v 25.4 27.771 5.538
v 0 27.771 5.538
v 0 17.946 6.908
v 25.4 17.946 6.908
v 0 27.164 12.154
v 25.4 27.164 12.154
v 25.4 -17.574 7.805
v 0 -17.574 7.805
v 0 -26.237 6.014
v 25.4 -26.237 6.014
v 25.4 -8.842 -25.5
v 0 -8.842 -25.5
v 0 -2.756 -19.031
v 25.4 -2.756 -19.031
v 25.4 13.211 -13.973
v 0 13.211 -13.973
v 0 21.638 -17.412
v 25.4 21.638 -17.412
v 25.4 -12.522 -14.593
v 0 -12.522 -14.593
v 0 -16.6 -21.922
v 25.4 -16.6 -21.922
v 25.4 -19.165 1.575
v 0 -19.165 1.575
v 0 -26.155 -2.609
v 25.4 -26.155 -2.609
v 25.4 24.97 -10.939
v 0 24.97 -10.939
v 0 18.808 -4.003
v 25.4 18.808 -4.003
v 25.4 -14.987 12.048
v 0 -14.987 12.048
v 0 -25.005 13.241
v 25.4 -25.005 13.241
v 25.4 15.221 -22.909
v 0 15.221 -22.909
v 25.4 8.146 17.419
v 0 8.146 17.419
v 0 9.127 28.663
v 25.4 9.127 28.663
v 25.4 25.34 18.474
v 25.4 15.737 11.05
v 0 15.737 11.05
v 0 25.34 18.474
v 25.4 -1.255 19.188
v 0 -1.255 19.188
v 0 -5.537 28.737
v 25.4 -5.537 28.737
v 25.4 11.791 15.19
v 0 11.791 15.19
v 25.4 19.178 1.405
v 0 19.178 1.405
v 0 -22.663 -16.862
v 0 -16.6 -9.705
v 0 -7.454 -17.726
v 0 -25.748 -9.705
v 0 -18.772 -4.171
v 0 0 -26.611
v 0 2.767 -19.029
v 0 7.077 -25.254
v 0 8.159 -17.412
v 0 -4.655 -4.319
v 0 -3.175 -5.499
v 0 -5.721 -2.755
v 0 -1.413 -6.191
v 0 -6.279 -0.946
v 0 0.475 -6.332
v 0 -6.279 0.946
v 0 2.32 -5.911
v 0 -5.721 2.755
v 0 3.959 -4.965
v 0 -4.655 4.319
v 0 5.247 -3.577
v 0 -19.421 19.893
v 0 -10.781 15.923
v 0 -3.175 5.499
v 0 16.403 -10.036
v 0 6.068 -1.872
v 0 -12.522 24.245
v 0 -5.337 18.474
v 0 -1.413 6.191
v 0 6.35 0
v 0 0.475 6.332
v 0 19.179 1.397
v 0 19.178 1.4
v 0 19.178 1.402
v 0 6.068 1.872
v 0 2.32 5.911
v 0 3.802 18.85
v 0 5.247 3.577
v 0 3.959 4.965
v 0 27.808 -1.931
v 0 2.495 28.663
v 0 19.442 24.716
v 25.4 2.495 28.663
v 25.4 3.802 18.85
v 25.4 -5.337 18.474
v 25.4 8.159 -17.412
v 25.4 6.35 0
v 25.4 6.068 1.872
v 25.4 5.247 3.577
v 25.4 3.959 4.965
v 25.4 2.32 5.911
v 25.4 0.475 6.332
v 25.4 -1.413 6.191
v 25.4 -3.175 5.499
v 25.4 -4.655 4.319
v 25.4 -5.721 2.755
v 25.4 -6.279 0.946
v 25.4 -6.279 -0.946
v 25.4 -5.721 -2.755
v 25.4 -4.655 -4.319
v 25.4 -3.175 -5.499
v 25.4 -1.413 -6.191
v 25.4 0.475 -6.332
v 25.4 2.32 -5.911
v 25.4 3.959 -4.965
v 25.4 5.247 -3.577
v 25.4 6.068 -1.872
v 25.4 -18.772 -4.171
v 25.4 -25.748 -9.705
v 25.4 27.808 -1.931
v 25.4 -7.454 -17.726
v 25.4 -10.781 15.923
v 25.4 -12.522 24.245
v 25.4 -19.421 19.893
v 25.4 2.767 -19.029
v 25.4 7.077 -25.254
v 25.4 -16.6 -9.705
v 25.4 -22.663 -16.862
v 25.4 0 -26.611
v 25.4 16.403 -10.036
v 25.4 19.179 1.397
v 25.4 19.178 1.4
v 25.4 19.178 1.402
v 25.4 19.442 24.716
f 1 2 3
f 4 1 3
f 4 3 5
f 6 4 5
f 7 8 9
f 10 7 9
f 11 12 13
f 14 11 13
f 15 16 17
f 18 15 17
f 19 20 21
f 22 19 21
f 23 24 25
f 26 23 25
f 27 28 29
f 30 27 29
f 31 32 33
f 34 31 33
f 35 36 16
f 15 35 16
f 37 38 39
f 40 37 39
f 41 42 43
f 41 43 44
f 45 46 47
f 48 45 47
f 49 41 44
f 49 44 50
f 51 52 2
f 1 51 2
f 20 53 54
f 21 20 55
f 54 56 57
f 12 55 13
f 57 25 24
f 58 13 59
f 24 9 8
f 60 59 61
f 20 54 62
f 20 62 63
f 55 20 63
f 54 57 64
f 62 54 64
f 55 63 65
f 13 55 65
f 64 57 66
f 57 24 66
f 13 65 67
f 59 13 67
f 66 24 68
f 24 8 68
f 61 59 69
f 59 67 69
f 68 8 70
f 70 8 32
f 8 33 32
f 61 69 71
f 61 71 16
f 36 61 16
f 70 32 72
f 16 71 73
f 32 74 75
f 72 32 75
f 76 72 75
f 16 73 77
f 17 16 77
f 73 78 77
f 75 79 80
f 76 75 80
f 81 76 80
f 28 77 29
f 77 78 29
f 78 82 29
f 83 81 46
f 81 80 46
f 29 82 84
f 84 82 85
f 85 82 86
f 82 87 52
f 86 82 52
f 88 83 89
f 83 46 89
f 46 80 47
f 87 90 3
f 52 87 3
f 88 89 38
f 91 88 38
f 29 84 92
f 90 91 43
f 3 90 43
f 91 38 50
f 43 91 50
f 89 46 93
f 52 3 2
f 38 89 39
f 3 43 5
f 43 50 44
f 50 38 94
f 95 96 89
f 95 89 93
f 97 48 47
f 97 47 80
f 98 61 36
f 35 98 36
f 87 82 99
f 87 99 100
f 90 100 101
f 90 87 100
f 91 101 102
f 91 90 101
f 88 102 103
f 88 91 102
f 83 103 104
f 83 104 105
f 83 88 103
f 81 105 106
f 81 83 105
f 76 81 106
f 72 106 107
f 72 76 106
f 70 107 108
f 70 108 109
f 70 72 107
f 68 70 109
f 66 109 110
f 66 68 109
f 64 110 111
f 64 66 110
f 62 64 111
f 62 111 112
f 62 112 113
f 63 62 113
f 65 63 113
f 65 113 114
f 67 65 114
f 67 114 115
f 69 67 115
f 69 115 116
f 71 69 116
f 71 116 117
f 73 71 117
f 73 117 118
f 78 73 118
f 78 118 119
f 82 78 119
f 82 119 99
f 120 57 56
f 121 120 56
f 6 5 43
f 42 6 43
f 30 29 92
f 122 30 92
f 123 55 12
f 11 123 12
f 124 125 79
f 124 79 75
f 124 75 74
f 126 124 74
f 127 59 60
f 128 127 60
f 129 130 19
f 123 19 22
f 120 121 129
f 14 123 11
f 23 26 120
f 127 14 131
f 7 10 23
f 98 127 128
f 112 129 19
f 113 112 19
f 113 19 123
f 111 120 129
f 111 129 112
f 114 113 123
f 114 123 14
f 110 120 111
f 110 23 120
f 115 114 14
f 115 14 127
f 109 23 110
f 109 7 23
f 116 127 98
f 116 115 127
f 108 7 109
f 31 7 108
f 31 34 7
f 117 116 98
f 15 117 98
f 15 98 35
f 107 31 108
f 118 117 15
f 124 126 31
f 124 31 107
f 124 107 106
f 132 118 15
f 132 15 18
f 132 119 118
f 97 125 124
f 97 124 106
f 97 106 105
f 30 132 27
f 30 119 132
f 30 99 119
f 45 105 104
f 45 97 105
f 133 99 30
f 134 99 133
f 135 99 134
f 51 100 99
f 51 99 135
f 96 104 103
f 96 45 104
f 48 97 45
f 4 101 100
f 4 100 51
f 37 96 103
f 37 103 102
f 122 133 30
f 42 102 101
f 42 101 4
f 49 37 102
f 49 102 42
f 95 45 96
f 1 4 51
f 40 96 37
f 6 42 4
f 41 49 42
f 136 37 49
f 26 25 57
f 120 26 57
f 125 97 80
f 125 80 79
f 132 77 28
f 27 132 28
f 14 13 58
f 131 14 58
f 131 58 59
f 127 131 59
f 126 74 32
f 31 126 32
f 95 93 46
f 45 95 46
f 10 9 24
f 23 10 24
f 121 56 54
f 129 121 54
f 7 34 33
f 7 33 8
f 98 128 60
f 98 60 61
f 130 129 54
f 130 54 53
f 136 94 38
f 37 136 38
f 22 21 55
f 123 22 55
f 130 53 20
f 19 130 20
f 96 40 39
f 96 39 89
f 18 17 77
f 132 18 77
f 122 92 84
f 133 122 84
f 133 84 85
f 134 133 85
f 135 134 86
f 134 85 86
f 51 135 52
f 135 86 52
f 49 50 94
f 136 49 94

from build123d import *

# Parameters (mm, degrees)
F0_R     = 6.35
F1_DEPTH = 12.7
F2_DEPTH = 25.4


with BuildPart() as f1:
    # F0 (on Right) → F1 (new body)
    with BuildSketch(Plane.YZ):
        with BuildLine():
            ThreePointArc((19.1779890784, 1.4045410483), (18.7646486695, 4.2018996845), (17.9455312271, 6.9083941421))
            ThreePointArc((17.9455312271, 6.9083941421), (16.9682929221, 9.0468246339), (15.7373856101, 11.0500088147))
            ThreePointArc((15.7373856101, 11.0500088147), (13.9188023359, 13.267816029), (11.7905793137, 15.1904654337))
            ThreePointArc((11.7905793137, 15.1904654337), (10.0305268432, 16.4059907319), (8.146362677, 17.4185181856))
            Line((8.146362677, 17.4185181856), (6.2738156783, 18.1771075114))
            ThreePointArc((6.2738156783, 18.1771075114), (5.0492538332, 18.5545960984), (3.8022694856, 18.8496882575))
            ThreePointArc((3.8022694856, 18.8496882575), (1.284752774, 19.1863860838), (-1.2551787188, 19.1883435197))
            ThreePointArc((-1.2551787188, 19.1883435197), (-3.3155527437, 18.9413597888), (-5.33731542, 18.473794))
            ThreePointArc((-5.33731542, 18.473794), (-8.1592905959, 17.4124661556), (-10.7806869477, 15.9230898252))
            ThreePointArc((-10.7806869477, 15.9230898252), (-13.0287220692, 14.1428569211), (-14.987024811, 12.0481155357))
            ThreePointArc((-14.987024811, 12.0481155357), (-16.4183682627, 10.0102539547), (-17.5743483924, 7.8045037785))
            ThreePointArc((-17.5743483924, 7.8045037785), (-18.6316829863, 4.7569307063), (-19.1647025444, 1.5754926314))
            ThreePointArc((-19.1647025444, 1.5754926314), (-19.1845061039, -1.3125266459), (-18.7715548633, -4.1709385826))
            ThreePointArc((-18.7715548633, -4.1709385826), (-17.9011716614, -7.0225389849), (-16.6004457918, -9.705318138))
            ThreePointArc((-16.6004457918, -9.705318138), (-14.7650993301, -12.3190844798), (-12.5224487856, -14.5930215192))
            ThreePointArc((-12.5224487856, -14.5930215192), (-10.1104693622, -16.356845965), (-7.4543542534, -17.7257045928))
            ThreePointArc((-7.4543542534, -17.7257045928), (-5.1467207251, -18.5277971282), (-2.7560125907, -19.0308274977))
            ThreePointArc((-2.7560125907, -19.0308274977), (0.0055746036, -19.229351772), (2.7670462291, -19.0292263588))
            ThreePointArc((2.7670462291, -19.0292263588), (5.5227369883, -18.4192121657), (8.1594508744, -17.4123910499))
            ThreePointArc((8.1594508744, -17.4123910499), (10.8224755536, -15.8947168436), (13.2105236497, -13.973190958))
            ThreePointArc((13.2105236497, -13.973190958), (14.9368977955, -12.1102058155), (16.4026784276, -10.0359424594))
            ThreePointArc((16.4026784276, -10.0359424594), (17.8618765328, -7.1218935245), (18.8080234165, -4.003280631))
            ThreePointArc((18.8080234165, -4.003280631), (19.1237302096, -2.0126955852), (19.22935258, 0))
            ThreePointArc((19.22935258, 0), (19.2166394569, 0.6991198959), (19.1785168978, 1.397315372))
            Line((19.1785168978, 1.397315372), (19.1698875278, 1.4006438432))
            Line((19.1698875278, 1.4006438432), (19.1779890784, 1.4045410483))
        make_face()
        Circle(F0_R, mode=Mode.SUBTRACT)
        with BuildLine():
            Line((27.7707912028, 5.5380598642), (17.9455312271, 6.9083941421))
            ThreePointArc((17.9455312271, 6.9083941421), (18.7646486695, 4.2018996845), (19.1779890784, 1.4045410483))
            Line((19.1779890784, 1.4045410483), (27.7707912028, 5.5380598642))
        make_face()
        with BuildLine():
            ThreePointArc((15.7373856101, 11.0500088147), (16.9682929221, 9.0468246339), (17.9455312271, 6.9083941421))
            Line((17.9455312271, 6.9083941421), (27.1644499153, 12.1538350359))
            Line((27.1644499153, 12.1538350359), (15.7373856101, 11.0500088147))
        make_face()
        with BuildLine():
            ThreePointArc((11.7905793137, 15.1904654337), (13.9188023359, 13.267816029), (15.7373856101, 11.0500088147))
            Line((15.7373856101, 11.0500088147), (25.3397952765, 18.473794))
            Line((25.3397952765, 18.473794), (11.7905793137, 15.1904654337))
        make_face()
        with BuildLine():
            ThreePointArc((19.1785168978, 1.397315372), (19.1782533284, 1.400928235), (19.1779890784, 1.4045410483))
            Line((19.1779890784, 1.4045410483), (19.1698875278, 1.4006438432))
            Line((19.1698875278, 1.4006438432), (19.1785168978, 1.397315372))
        make_face()
        with BuildLine():
            ThreePointArc((8.146362677, 17.4185181856), (10.0305268432, 16.4059907319), (11.7905793137, 15.1904654337))
            Line((11.7905793137, 15.1904654337), (19.4416427454, 24.7160838446))
            Line((19.4416427454, 24.7160838446), (8.146362677, 17.4185181856))
        make_face()
        with BuildLine():
            Line((27.8078578413, -1.9311446231), (19.1785168978, 1.397315372))
            ThreePointArc((19.1785168978, 1.397315372), (19.2166394569, 0.6991198959), (19.22935258, 0))
            ThreePointArc((19.22935258, 0), (19.1237302096, -2.0126955852), (18.8080234165, -4.003280631))
            Line((18.8080234165, -4.003280631), (27.8078578413, -1.9311446231))
        make_face()
        with BuildLine():
            Line((6.2738156783, 18.1771075114), (8.146362677, 17.4185181856))
            ThreePointArc((8.146362677, 17.4185181856), (7.2200588911, 17.822422682), (6.2738156783, 18.1771075114))
        make_face()
        with BuildLine():
            ThreePointArc((6.2738156783, 18.1771075114), (7.2200588911, 17.822422682), (8.146362677, 17.4185181856))
            Line((8.146362677, 17.4185181856), (9.1274725273, 28.6630652845))
            Line((9.1274725273, 28.6630652845), (3.8022694856, 18.8496882575))
            ThreePointArc((3.8022694856, 18.8496882575), (5.0492538332, 18.5545960984), (6.2738156783, 18.1771075114))
        make_face()
        with BuildLine():
            Line((24.9696671963, -10.9393130988), (18.8080234165, -4.003280631))
            ThreePointArc((18.8080234165, -4.003280631), (17.8618765328, -7.1218935245), (16.4026784276, -10.0359424594))
            Line((16.4026784276, -10.0359424594), (24.9696671963, -10.9393130988))
        make_face()
        with BuildLine():
            ThreePointArc((-1.2551787188, 19.1883435197), (1.284752774, 19.1863860838), (3.8022694856, 18.8496882575))
            Line((3.8022694856, 18.8496882575), (2.4951577652, 28.6630652845))
            Line((2.4951577652, 28.6630652845), (-1.2551787188, 19.1883435197))
        make_face()
        with BuildLine():
            Line((21.637879312, -17.4123910499), (16.4026784276, -10.0359424594))
            ThreePointArc((16.4026784276, -10.0359424594), (14.9368977955, -12.1102058155), (13.2105236497, -13.973190958))
            Line((13.2105236497, -13.973190958), (21.637879312, -17.4123910499))
        make_face()
        with BuildLine():
            ThreePointArc((-5.33731542, 18.473794), (-3.3155527437, 18.9413597888), (-1.2551787188, 19.1883435197))
            Line((-1.2551787188, 19.1883435197), (-5.5373124778, 28.7367589772))
            Line((-5.5373124778, 28.7367589772), (-5.33731542, 18.473794))
        make_face()
        with BuildLine():
            Line((15.2211012319, -22.9090731591), (13.2105236497, -13.973190958))
            ThreePointArc((13.2105236497, -13.973190958), (10.8224755536, -15.8947168436), (8.1594508744, -17.4123910499))
            Line((8.1594508744, -17.4123910499), (15.2211012319, -22.9090731591))
        make_face()
        with BuildLine():
            ThreePointArc((-10.7806869477, 15.9230898252), (-8.1592905959, 17.4124661556), (-5.33731542, 18.473794))
            Line((-5.33731542, 18.473794), (-12.5224487856, 24.2449585348))
            Line((-12.5224487856, 24.2449585348), (-10.7806869477, 15.9230898252))
        make_face()
        with BuildLine():
            Line((7.0767295547, -25.2536628395), (8.1594508744, -17.4123910499))
            ThreePointArc((8.1594508744, -17.4123910499), (5.5227369883, -18.4192121657), (2.7670462291, -19.0292263588))
            Line((2.7670462291, -19.0292263588), (7.0767295547, -25.2536628395))
        make_face()
        with BuildLine():
            ThreePointArc((-14.987024811, 12.0481155357), (-13.0287220692, 14.1428569211), (-10.7806869477, 15.9230898252))
            Line((-10.7806869477, 15.9230898252), (-19.4206815213, 19.8925025761))
            Line((-19.4206815213, 19.8925025761), (-14.987024811, 12.0481155357))
        make_face()
        with BuildLine():
            Line((0, -26.6110599041), (2.7670462291, -19.0292263588))
            ThreePointArc((2.7670462291, -19.0292263588), (0.0055746036, -19.229351772), (-2.7560125907, -19.0308274977))
            Line((-2.7560125907, -19.0308274977), (0, -26.6110599041))
        make_face()
        with BuildLine():
            ThreePointArc((-17.5743483924, 7.8045037785), (-16.4183682627, 10.0102539547), (-14.987024811, 12.0481155357))
            Line((-14.987024811, 12.0481155357), (-25.0049643219, 13.2406353951))
            Line((-25.0049643219, 13.2406353951), (-17.5743483924, 7.8045037785))
        make_face()
        with BuildLine():
            Line((-8.8418172672, -25.5004633218), (-2.7560125907, -19.0308274977))
            ThreePointArc((-2.7560125907, -19.0308274977), (-5.1467207251, -18.5277971282), (-7.4543542534, -17.7257045928))
            Line((-7.4543542534, -17.7257045928), (-8.8418172672, -25.5004633218))
        make_face()
        with BuildLine():
            ThreePointArc((-19.1647025444, 1.5754926314), (-18.6316829863, 4.7569307063), (-17.5743483924, 7.8045037785))
            Line((-17.5743483924, 7.8045037785), (-26.2367911637, 6.0139154084))
            Line((-26.2367911637, 6.0139154084), (-19.1647025444, 1.5754926314))
        make_face()
        with BuildLine():
            Line((-16.6004457918, -21.9218768179), (-7.4543542534, -17.7257045928))
            ThreePointArc((-7.4543542534, -17.7257045928), (-10.1104693622, -16.356845965), (-12.5224487856, -14.5930215192))
            Line((-12.5224487856, -14.5930215192), (-16.6004457918, -21.9218768179))
        make_face()
        with BuildLine():
            ThreePointArc((-18.7715548633, -4.1709385826), (-19.1845061039, -1.3125266459), (-19.1647025444, 1.5754926314))
            Line((-19.1647025444, 1.5754926314), (-26.1546708643, -2.6088752784))
            Line((-26.1546708643, -2.6088752784), (-18.7715548633, -4.1709385826))
        make_face()
        with BuildLine():
            Line((-22.6625707, -16.8624930084), (-12.5224487856, -14.5930215192))
            ThreePointArc((-12.5224487856, -14.5930215192), (-14.7650993301, -12.3190844798), (-16.6004457918, -9.705318138))
            Line((-16.6004457918, -9.705318138), (-22.6625707, -16.8624930084))
        make_face()
        with BuildLine():
            ThreePointArc((-16.6004457918, -9.705318138), (-17.9011716614, -7.0225389849), (-18.7715548633, -4.1709385826))
            Line((-18.7715548633, -4.1709385826), (-25.7475599647, -9.705318138))
            Line((-25.7475599647, -9.705318138), (-16.6004457918, -9.705318138))
        make_face()
    extrude(amount=F1_DEPTH)

    # F0 (on Right) → F2 (join)
    with BuildSketch(Plane.YZ):
        with BuildLine():
            ThreePointArc((19.1779890784, 1.4045410483), (18.7646486695, 4.2018996845), (17.9455312271, 6.9083941421))
            ThreePointArc((17.9455312271, 6.9083941421), (16.9682929221, 9.0468246339), (15.7373856101, 11.0500088147))
            ThreePointArc((15.7373856101, 11.0500088147), (13.9188023359, 13.267816029), (11.7905793137, 15.1904654337))
            ThreePointArc((11.7905793137, 15.1904654337), (10.0305268432, 16.4059907319), (8.146362677, 17.4185181856))
            Line((8.146362677, 17.4185181856), (6.2738156783, 18.1771075114))
            ThreePointArc((6.2738156783, 18.1771075114), (5.0492538332, 18.5545960984), (3.8022694856, 18.8496882575))
            ThreePointArc((3.8022694856, 18.8496882575), (1.284752774, 19.1863860838), (-1.2551787188, 19.1883435197))
            ThreePointArc((-1.2551787188, 19.1883435197), (-3.3155527437, 18.9413597888), (-5.33731542, 18.473794))
            ThreePointArc((-5.33731542, 18.473794), (-8.1592905959, 17.4124661556), (-10.7806869477, 15.9230898252))
            ThreePointArc((-10.7806869477, 15.9230898252), (-13.0287220692, 14.1428569211), (-14.987024811, 12.0481155357))
            ThreePointArc((-14.987024811, 12.0481155357), (-16.4183682627, 10.0102539547), (-17.5743483924, 7.8045037785))
            ThreePointArc((-17.5743483924, 7.8045037785), (-18.6316829863, 4.7569307063), (-19.1647025444, 1.5754926314))
            ThreePointArc((-19.1647025444, 1.5754926314), (-19.1845061039, -1.3125266459), (-18.7715548633, -4.1709385826))
            ThreePointArc((-18.7715548633, -4.1709385826), (-17.9011716614, -7.0225389849), (-16.6004457918, -9.705318138))
            ThreePointArc((-16.6004457918, -9.705318138), (-14.7650993301, -12.3190844798), (-12.5224487856, -14.5930215192))
            ThreePointArc((-12.5224487856, -14.5930215192), (-10.1104693622, -16.356845965), (-7.4543542534, -17.7257045928))
            ThreePointArc((-7.4543542534, -17.7257045928), (-5.1467207251, -18.5277971282), (-2.7560125907, -19.0308274977))
            ThreePointArc((-2.7560125907, -19.0308274977), (0.0055746036, -19.229351772), (2.7670462291, -19.0292263588))
            ThreePointArc((2.7670462291, -19.0292263588), (5.5227369883, -18.4192121657), (8.1594508744, -17.4123910499))
            ThreePointArc((8.1594508744, -17.4123910499), (10.8224755536, -15.8947168436), (13.2105236497, -13.973190958))
            ThreePointArc((13.2105236497, -13.973190958), (14.9368977955, -12.1102058155), (16.4026784276, -10.0359424594))
            ThreePointArc((16.4026784276, -10.0359424594), (17.8618765328, -7.1218935245), (18.8080234165, -4.003280631))
            ThreePointArc((18.8080234165, -4.003280631), (19.1237302096, -2.0126955852), (19.22935258, 0))
            ThreePointArc((19.22935258, 0), (19.2166394569, 0.6991198959), (19.1785168978, 1.397315372))
            Line((19.1785168978, 1.397315372), (19.1698875278, 1.4006438432))
            Line((19.1698875278, 1.4006438432), (19.1779890784, 1.4045410483))
        make_face()
        Circle(F0_R, mode=Mode.SUBTRACT)
        with BuildLine():
            Line((27.7707912028, 5.5380598642), (17.9455312271, 6.9083941421))
            ThreePointArc((17.9455312271, 6.9083941421), (18.7646486695, 4.2018996845), (19.1779890784, 1.4045410483))
            Line((19.1779890784, 1.4045410483), (27.7707912028, 5.5380598642))
        make_face()
        with BuildLine():
            ThreePointArc((15.7373856101, 11.0500088147), (16.9682929221, 9.0468246339), (17.9455312271, 6.9083941421))
            Line((17.9455312271, 6.9083941421), (27.1644499153, 12.1538350359))
            Line((27.1644499153, 12.1538350359), (15.7373856101, 11.0500088147))
        make_face()
        with BuildLine():
            ThreePointArc((11.7905793137, 15.1904654337), (13.9188023359, 13.267816029), (15.7373856101, 11.0500088147))
            Line((15.7373856101, 11.0500088147), (25.3397952765, 18.473794))
            Line((25.3397952765, 18.473794), (11.7905793137, 15.1904654337))
        make_face()
        with BuildLine():
            ThreePointArc((19.1785168978, 1.397315372), (19.1782533284, 1.400928235), (19.1779890784, 1.4045410483))
            Line((19.1779890784, 1.4045410483), (19.1698875278, 1.4006438432))
            Line((19.1698875278, 1.4006438432), (19.1785168978, 1.397315372))
        make_face()
        with BuildLine():
            ThreePointArc((8.146362677, 17.4185181856), (10.0305268432, 16.4059907319), (11.7905793137, 15.1904654337))
            Line((11.7905793137, 15.1904654337), (19.4416427454, 24.7160838446))
            Line((19.4416427454, 24.7160838446), (8.146362677, 17.4185181856))
        make_face()
        with BuildLine():
            Line((27.8078578413, -1.9311446231), (19.1785168978, 1.397315372))
            ThreePointArc((19.1785168978, 1.397315372), (19.2166394569, 0.6991198959), (19.22935258, 0))
            ThreePointArc((19.22935258, 0), (19.1237302096, -2.0126955852), (18.8080234165, -4.003280631))
            Line((18.8080234165, -4.003280631), (27.8078578413, -1.9311446231))
        make_face()
        with BuildLine():
            Line((6.2738156783, 18.1771075114), (8.146362677, 17.4185181856))
            ThreePointArc((8.146362677, 17.4185181856), (7.2200588911, 17.822422682), (6.2738156783, 18.1771075114))
        make_face()
        with BuildLine():
            ThreePointArc((6.2738156783, 18.1771075114), (7.2200588911, 17.822422682), (8.146362677, 17.4185181856))
            Line((8.146362677, 17.4185181856), (9.1274725273, 28.6630652845))
            Line((9.1274725273, 28.6630652845), (3.8022694856, 18.8496882575))
            ThreePointArc((3.8022694856, 18.8496882575), (5.0492538332, 18.5545960984), (6.2738156783, 18.1771075114))
        make_face()
        with BuildLine():
            Line((24.9696671963, -10.9393130988), (18.8080234165, -4.003280631))
            ThreePointArc((18.8080234165, -4.003280631), (17.8618765328, -7.1218935245), (16.4026784276, -10.0359424594))
            Line((16.4026784276, -10.0359424594), (24.9696671963, -10.9393130988))
        make_face()
        with BuildLine():
            ThreePointArc((-1.2551787188, 19.1883435197), (1.284752774, 19.1863860838), (3.8022694856, 18.8496882575))
            Line((3.8022694856, 18.8496882575), (2.4951577652, 28.6630652845))
            Line((2.4951577652, 28.6630652845), (-1.2551787188, 19.1883435197))
        make_face()
        with BuildLine():
            Line((21.637879312, -17.4123910499), (16.4026784276, -10.0359424594))
            ThreePointArc((16.4026784276, -10.0359424594), (14.9368977955, -12.1102058155), (13.2105236497, -13.973190958))
            Line((13.2105236497, -13.973190958), (21.637879312, -17.4123910499))
        make_face()
        with BuildLine():
            ThreePointArc((-5.33731542, 18.473794), (-3.3155527437, 18.9413597888), (-1.2551787188, 19.1883435197))
            Line((-1.2551787188, 19.1883435197), (-5.5373124778, 28.7367589772))
            Line((-5.5373124778, 28.7367589772), (-5.33731542, 18.473794))
        make_face()
        with BuildLine():
            Line((15.2211012319, -22.9090731591), (13.2105236497, -13.973190958))
            ThreePointArc((13.2105236497, -13.973190958), (10.8224755536, -15.8947168436), (8.1594508744, -17.4123910499))
            Line((8.1594508744, -17.4123910499), (15.2211012319, -22.9090731591))
        make_face()
        with BuildLine():
            ThreePointArc((-10.7806869477, 15.9230898252), (-8.1592905959, 17.4124661556), (-5.33731542, 18.473794))
            Line((-5.33731542, 18.473794), (-12.5224487856, 24.2449585348))
            Line((-12.5224487856, 24.2449585348), (-10.7806869477, 15.9230898252))
        make_face()
        with BuildLine():
            Line((7.0767295547, -25.2536628395), (8.1594508744, -17.4123910499))
            ThreePointArc((8.1594508744, -17.4123910499), (5.5227369883, -18.4192121657), (2.7670462291, -19.0292263588))
            Line((2.7670462291, -19.0292263588), (7.0767295547, -25.2536628395))
        make_face()
        with BuildLine():
            ThreePointArc((-14.987024811, 12.0481155357), (-13.0287220692, 14.1428569211), (-10.7806869477, 15.9230898252))
            Line((-10.7806869477, 15.9230898252), (-19.4206815213, 19.8925025761))
            Line((-19.4206815213, 19.8925025761), (-14.987024811, 12.0481155357))
        make_face()
        with BuildLine():
            Line((0, -26.6110599041), (2.7670462291, -19.0292263588))
            ThreePointArc((2.7670462291, -19.0292263588), (0.0055746036, -19.229351772), (-2.7560125907, -19.0308274977))
            Line((-2.7560125907, -19.0308274977), (0, -26.6110599041))
        make_face()
        with BuildLine():
            ThreePointArc((-17.5743483924, 7.8045037785), (-16.4183682627, 10.0102539547), (-14.987024811, 12.0481155357))
            Line((-14.987024811, 12.0481155357), (-25.0049643219, 13.2406353951))
            Line((-25.0049643219, 13.2406353951), (-17.5743483924, 7.8045037785))
        make_face()
        with BuildLine():
            Line((-8.8418172672, -25.5004633218), (-2.7560125907, -19.0308274977))
            ThreePointArc((-2.7560125907, -19.0308274977), (-5.1467207251, -18.5277971282), (-7.4543542534, -17.7257045928))
            Line((-7.4543542534, -17.7257045928), (-8.8418172672, -25.5004633218))
        make_face()
        with BuildLine():
            ThreePointArc((-19.1647025444, 1.5754926314), (-18.6316829863, 4.7569307063), (-17.5743483924, 7.8045037785))
            Line((-17.5743483924, 7.8045037785), (-26.2367911637, 6.0139154084))
            Line((-26.2367911637, 6.0139154084), (-19.1647025444, 1.5754926314))
        make_face()
        with BuildLine():
            Line((-16.6004457918, -21.9218768179), (-7.4543542534, -17.7257045928))
            ThreePointArc((-7.4543542534, -17.7257045928), (-10.1104693622, -16.356845965), (-12.5224487856, -14.5930215192))
            Line((-12.5224487856, -14.5930215192), (-16.6004457918, -21.9218768179))
        make_face()
        with BuildLine():
            ThreePointArc((-18.7715548633, -4.1709385826), (-19.1845061039, -1.3125266459), (-19.1647025444, 1.5754926314))
            Line((-19.1647025444, 1.5754926314), (-26.1546708643, -2.6088752784))
            Line((-26.1546708643, -2.6088752784), (-18.7715548633, -4.1709385826))
        make_face()
        with BuildLine():
            Line((-22.6625707, -16.8624930084), (-12.5224487856, -14.5930215192))
            ThreePointArc((-12.5224487856, -14.5930215192), (-14.7650993301, -12.3190844798), (-16.6004457918, -9.705318138))
            Line((-16.6004457918, -9.705318138), (-22.6625707, -16.8624930084))
        make_face()
        with BuildLine():
            ThreePointArc((-16.6004457918, -9.705318138), (-17.9011716614, -7.0225389849), (-18.7715548633, -4.1709385826))
            Line((-18.7715548633, -4.1709385826), (-25.7475599647, -9.705318138))
            Line((-25.7475599647, -9.705318138), (-16.6004457918, -9.705318138))
        make_face()
    extrude(amount=F2_DEPTH)


solid = f1.part
